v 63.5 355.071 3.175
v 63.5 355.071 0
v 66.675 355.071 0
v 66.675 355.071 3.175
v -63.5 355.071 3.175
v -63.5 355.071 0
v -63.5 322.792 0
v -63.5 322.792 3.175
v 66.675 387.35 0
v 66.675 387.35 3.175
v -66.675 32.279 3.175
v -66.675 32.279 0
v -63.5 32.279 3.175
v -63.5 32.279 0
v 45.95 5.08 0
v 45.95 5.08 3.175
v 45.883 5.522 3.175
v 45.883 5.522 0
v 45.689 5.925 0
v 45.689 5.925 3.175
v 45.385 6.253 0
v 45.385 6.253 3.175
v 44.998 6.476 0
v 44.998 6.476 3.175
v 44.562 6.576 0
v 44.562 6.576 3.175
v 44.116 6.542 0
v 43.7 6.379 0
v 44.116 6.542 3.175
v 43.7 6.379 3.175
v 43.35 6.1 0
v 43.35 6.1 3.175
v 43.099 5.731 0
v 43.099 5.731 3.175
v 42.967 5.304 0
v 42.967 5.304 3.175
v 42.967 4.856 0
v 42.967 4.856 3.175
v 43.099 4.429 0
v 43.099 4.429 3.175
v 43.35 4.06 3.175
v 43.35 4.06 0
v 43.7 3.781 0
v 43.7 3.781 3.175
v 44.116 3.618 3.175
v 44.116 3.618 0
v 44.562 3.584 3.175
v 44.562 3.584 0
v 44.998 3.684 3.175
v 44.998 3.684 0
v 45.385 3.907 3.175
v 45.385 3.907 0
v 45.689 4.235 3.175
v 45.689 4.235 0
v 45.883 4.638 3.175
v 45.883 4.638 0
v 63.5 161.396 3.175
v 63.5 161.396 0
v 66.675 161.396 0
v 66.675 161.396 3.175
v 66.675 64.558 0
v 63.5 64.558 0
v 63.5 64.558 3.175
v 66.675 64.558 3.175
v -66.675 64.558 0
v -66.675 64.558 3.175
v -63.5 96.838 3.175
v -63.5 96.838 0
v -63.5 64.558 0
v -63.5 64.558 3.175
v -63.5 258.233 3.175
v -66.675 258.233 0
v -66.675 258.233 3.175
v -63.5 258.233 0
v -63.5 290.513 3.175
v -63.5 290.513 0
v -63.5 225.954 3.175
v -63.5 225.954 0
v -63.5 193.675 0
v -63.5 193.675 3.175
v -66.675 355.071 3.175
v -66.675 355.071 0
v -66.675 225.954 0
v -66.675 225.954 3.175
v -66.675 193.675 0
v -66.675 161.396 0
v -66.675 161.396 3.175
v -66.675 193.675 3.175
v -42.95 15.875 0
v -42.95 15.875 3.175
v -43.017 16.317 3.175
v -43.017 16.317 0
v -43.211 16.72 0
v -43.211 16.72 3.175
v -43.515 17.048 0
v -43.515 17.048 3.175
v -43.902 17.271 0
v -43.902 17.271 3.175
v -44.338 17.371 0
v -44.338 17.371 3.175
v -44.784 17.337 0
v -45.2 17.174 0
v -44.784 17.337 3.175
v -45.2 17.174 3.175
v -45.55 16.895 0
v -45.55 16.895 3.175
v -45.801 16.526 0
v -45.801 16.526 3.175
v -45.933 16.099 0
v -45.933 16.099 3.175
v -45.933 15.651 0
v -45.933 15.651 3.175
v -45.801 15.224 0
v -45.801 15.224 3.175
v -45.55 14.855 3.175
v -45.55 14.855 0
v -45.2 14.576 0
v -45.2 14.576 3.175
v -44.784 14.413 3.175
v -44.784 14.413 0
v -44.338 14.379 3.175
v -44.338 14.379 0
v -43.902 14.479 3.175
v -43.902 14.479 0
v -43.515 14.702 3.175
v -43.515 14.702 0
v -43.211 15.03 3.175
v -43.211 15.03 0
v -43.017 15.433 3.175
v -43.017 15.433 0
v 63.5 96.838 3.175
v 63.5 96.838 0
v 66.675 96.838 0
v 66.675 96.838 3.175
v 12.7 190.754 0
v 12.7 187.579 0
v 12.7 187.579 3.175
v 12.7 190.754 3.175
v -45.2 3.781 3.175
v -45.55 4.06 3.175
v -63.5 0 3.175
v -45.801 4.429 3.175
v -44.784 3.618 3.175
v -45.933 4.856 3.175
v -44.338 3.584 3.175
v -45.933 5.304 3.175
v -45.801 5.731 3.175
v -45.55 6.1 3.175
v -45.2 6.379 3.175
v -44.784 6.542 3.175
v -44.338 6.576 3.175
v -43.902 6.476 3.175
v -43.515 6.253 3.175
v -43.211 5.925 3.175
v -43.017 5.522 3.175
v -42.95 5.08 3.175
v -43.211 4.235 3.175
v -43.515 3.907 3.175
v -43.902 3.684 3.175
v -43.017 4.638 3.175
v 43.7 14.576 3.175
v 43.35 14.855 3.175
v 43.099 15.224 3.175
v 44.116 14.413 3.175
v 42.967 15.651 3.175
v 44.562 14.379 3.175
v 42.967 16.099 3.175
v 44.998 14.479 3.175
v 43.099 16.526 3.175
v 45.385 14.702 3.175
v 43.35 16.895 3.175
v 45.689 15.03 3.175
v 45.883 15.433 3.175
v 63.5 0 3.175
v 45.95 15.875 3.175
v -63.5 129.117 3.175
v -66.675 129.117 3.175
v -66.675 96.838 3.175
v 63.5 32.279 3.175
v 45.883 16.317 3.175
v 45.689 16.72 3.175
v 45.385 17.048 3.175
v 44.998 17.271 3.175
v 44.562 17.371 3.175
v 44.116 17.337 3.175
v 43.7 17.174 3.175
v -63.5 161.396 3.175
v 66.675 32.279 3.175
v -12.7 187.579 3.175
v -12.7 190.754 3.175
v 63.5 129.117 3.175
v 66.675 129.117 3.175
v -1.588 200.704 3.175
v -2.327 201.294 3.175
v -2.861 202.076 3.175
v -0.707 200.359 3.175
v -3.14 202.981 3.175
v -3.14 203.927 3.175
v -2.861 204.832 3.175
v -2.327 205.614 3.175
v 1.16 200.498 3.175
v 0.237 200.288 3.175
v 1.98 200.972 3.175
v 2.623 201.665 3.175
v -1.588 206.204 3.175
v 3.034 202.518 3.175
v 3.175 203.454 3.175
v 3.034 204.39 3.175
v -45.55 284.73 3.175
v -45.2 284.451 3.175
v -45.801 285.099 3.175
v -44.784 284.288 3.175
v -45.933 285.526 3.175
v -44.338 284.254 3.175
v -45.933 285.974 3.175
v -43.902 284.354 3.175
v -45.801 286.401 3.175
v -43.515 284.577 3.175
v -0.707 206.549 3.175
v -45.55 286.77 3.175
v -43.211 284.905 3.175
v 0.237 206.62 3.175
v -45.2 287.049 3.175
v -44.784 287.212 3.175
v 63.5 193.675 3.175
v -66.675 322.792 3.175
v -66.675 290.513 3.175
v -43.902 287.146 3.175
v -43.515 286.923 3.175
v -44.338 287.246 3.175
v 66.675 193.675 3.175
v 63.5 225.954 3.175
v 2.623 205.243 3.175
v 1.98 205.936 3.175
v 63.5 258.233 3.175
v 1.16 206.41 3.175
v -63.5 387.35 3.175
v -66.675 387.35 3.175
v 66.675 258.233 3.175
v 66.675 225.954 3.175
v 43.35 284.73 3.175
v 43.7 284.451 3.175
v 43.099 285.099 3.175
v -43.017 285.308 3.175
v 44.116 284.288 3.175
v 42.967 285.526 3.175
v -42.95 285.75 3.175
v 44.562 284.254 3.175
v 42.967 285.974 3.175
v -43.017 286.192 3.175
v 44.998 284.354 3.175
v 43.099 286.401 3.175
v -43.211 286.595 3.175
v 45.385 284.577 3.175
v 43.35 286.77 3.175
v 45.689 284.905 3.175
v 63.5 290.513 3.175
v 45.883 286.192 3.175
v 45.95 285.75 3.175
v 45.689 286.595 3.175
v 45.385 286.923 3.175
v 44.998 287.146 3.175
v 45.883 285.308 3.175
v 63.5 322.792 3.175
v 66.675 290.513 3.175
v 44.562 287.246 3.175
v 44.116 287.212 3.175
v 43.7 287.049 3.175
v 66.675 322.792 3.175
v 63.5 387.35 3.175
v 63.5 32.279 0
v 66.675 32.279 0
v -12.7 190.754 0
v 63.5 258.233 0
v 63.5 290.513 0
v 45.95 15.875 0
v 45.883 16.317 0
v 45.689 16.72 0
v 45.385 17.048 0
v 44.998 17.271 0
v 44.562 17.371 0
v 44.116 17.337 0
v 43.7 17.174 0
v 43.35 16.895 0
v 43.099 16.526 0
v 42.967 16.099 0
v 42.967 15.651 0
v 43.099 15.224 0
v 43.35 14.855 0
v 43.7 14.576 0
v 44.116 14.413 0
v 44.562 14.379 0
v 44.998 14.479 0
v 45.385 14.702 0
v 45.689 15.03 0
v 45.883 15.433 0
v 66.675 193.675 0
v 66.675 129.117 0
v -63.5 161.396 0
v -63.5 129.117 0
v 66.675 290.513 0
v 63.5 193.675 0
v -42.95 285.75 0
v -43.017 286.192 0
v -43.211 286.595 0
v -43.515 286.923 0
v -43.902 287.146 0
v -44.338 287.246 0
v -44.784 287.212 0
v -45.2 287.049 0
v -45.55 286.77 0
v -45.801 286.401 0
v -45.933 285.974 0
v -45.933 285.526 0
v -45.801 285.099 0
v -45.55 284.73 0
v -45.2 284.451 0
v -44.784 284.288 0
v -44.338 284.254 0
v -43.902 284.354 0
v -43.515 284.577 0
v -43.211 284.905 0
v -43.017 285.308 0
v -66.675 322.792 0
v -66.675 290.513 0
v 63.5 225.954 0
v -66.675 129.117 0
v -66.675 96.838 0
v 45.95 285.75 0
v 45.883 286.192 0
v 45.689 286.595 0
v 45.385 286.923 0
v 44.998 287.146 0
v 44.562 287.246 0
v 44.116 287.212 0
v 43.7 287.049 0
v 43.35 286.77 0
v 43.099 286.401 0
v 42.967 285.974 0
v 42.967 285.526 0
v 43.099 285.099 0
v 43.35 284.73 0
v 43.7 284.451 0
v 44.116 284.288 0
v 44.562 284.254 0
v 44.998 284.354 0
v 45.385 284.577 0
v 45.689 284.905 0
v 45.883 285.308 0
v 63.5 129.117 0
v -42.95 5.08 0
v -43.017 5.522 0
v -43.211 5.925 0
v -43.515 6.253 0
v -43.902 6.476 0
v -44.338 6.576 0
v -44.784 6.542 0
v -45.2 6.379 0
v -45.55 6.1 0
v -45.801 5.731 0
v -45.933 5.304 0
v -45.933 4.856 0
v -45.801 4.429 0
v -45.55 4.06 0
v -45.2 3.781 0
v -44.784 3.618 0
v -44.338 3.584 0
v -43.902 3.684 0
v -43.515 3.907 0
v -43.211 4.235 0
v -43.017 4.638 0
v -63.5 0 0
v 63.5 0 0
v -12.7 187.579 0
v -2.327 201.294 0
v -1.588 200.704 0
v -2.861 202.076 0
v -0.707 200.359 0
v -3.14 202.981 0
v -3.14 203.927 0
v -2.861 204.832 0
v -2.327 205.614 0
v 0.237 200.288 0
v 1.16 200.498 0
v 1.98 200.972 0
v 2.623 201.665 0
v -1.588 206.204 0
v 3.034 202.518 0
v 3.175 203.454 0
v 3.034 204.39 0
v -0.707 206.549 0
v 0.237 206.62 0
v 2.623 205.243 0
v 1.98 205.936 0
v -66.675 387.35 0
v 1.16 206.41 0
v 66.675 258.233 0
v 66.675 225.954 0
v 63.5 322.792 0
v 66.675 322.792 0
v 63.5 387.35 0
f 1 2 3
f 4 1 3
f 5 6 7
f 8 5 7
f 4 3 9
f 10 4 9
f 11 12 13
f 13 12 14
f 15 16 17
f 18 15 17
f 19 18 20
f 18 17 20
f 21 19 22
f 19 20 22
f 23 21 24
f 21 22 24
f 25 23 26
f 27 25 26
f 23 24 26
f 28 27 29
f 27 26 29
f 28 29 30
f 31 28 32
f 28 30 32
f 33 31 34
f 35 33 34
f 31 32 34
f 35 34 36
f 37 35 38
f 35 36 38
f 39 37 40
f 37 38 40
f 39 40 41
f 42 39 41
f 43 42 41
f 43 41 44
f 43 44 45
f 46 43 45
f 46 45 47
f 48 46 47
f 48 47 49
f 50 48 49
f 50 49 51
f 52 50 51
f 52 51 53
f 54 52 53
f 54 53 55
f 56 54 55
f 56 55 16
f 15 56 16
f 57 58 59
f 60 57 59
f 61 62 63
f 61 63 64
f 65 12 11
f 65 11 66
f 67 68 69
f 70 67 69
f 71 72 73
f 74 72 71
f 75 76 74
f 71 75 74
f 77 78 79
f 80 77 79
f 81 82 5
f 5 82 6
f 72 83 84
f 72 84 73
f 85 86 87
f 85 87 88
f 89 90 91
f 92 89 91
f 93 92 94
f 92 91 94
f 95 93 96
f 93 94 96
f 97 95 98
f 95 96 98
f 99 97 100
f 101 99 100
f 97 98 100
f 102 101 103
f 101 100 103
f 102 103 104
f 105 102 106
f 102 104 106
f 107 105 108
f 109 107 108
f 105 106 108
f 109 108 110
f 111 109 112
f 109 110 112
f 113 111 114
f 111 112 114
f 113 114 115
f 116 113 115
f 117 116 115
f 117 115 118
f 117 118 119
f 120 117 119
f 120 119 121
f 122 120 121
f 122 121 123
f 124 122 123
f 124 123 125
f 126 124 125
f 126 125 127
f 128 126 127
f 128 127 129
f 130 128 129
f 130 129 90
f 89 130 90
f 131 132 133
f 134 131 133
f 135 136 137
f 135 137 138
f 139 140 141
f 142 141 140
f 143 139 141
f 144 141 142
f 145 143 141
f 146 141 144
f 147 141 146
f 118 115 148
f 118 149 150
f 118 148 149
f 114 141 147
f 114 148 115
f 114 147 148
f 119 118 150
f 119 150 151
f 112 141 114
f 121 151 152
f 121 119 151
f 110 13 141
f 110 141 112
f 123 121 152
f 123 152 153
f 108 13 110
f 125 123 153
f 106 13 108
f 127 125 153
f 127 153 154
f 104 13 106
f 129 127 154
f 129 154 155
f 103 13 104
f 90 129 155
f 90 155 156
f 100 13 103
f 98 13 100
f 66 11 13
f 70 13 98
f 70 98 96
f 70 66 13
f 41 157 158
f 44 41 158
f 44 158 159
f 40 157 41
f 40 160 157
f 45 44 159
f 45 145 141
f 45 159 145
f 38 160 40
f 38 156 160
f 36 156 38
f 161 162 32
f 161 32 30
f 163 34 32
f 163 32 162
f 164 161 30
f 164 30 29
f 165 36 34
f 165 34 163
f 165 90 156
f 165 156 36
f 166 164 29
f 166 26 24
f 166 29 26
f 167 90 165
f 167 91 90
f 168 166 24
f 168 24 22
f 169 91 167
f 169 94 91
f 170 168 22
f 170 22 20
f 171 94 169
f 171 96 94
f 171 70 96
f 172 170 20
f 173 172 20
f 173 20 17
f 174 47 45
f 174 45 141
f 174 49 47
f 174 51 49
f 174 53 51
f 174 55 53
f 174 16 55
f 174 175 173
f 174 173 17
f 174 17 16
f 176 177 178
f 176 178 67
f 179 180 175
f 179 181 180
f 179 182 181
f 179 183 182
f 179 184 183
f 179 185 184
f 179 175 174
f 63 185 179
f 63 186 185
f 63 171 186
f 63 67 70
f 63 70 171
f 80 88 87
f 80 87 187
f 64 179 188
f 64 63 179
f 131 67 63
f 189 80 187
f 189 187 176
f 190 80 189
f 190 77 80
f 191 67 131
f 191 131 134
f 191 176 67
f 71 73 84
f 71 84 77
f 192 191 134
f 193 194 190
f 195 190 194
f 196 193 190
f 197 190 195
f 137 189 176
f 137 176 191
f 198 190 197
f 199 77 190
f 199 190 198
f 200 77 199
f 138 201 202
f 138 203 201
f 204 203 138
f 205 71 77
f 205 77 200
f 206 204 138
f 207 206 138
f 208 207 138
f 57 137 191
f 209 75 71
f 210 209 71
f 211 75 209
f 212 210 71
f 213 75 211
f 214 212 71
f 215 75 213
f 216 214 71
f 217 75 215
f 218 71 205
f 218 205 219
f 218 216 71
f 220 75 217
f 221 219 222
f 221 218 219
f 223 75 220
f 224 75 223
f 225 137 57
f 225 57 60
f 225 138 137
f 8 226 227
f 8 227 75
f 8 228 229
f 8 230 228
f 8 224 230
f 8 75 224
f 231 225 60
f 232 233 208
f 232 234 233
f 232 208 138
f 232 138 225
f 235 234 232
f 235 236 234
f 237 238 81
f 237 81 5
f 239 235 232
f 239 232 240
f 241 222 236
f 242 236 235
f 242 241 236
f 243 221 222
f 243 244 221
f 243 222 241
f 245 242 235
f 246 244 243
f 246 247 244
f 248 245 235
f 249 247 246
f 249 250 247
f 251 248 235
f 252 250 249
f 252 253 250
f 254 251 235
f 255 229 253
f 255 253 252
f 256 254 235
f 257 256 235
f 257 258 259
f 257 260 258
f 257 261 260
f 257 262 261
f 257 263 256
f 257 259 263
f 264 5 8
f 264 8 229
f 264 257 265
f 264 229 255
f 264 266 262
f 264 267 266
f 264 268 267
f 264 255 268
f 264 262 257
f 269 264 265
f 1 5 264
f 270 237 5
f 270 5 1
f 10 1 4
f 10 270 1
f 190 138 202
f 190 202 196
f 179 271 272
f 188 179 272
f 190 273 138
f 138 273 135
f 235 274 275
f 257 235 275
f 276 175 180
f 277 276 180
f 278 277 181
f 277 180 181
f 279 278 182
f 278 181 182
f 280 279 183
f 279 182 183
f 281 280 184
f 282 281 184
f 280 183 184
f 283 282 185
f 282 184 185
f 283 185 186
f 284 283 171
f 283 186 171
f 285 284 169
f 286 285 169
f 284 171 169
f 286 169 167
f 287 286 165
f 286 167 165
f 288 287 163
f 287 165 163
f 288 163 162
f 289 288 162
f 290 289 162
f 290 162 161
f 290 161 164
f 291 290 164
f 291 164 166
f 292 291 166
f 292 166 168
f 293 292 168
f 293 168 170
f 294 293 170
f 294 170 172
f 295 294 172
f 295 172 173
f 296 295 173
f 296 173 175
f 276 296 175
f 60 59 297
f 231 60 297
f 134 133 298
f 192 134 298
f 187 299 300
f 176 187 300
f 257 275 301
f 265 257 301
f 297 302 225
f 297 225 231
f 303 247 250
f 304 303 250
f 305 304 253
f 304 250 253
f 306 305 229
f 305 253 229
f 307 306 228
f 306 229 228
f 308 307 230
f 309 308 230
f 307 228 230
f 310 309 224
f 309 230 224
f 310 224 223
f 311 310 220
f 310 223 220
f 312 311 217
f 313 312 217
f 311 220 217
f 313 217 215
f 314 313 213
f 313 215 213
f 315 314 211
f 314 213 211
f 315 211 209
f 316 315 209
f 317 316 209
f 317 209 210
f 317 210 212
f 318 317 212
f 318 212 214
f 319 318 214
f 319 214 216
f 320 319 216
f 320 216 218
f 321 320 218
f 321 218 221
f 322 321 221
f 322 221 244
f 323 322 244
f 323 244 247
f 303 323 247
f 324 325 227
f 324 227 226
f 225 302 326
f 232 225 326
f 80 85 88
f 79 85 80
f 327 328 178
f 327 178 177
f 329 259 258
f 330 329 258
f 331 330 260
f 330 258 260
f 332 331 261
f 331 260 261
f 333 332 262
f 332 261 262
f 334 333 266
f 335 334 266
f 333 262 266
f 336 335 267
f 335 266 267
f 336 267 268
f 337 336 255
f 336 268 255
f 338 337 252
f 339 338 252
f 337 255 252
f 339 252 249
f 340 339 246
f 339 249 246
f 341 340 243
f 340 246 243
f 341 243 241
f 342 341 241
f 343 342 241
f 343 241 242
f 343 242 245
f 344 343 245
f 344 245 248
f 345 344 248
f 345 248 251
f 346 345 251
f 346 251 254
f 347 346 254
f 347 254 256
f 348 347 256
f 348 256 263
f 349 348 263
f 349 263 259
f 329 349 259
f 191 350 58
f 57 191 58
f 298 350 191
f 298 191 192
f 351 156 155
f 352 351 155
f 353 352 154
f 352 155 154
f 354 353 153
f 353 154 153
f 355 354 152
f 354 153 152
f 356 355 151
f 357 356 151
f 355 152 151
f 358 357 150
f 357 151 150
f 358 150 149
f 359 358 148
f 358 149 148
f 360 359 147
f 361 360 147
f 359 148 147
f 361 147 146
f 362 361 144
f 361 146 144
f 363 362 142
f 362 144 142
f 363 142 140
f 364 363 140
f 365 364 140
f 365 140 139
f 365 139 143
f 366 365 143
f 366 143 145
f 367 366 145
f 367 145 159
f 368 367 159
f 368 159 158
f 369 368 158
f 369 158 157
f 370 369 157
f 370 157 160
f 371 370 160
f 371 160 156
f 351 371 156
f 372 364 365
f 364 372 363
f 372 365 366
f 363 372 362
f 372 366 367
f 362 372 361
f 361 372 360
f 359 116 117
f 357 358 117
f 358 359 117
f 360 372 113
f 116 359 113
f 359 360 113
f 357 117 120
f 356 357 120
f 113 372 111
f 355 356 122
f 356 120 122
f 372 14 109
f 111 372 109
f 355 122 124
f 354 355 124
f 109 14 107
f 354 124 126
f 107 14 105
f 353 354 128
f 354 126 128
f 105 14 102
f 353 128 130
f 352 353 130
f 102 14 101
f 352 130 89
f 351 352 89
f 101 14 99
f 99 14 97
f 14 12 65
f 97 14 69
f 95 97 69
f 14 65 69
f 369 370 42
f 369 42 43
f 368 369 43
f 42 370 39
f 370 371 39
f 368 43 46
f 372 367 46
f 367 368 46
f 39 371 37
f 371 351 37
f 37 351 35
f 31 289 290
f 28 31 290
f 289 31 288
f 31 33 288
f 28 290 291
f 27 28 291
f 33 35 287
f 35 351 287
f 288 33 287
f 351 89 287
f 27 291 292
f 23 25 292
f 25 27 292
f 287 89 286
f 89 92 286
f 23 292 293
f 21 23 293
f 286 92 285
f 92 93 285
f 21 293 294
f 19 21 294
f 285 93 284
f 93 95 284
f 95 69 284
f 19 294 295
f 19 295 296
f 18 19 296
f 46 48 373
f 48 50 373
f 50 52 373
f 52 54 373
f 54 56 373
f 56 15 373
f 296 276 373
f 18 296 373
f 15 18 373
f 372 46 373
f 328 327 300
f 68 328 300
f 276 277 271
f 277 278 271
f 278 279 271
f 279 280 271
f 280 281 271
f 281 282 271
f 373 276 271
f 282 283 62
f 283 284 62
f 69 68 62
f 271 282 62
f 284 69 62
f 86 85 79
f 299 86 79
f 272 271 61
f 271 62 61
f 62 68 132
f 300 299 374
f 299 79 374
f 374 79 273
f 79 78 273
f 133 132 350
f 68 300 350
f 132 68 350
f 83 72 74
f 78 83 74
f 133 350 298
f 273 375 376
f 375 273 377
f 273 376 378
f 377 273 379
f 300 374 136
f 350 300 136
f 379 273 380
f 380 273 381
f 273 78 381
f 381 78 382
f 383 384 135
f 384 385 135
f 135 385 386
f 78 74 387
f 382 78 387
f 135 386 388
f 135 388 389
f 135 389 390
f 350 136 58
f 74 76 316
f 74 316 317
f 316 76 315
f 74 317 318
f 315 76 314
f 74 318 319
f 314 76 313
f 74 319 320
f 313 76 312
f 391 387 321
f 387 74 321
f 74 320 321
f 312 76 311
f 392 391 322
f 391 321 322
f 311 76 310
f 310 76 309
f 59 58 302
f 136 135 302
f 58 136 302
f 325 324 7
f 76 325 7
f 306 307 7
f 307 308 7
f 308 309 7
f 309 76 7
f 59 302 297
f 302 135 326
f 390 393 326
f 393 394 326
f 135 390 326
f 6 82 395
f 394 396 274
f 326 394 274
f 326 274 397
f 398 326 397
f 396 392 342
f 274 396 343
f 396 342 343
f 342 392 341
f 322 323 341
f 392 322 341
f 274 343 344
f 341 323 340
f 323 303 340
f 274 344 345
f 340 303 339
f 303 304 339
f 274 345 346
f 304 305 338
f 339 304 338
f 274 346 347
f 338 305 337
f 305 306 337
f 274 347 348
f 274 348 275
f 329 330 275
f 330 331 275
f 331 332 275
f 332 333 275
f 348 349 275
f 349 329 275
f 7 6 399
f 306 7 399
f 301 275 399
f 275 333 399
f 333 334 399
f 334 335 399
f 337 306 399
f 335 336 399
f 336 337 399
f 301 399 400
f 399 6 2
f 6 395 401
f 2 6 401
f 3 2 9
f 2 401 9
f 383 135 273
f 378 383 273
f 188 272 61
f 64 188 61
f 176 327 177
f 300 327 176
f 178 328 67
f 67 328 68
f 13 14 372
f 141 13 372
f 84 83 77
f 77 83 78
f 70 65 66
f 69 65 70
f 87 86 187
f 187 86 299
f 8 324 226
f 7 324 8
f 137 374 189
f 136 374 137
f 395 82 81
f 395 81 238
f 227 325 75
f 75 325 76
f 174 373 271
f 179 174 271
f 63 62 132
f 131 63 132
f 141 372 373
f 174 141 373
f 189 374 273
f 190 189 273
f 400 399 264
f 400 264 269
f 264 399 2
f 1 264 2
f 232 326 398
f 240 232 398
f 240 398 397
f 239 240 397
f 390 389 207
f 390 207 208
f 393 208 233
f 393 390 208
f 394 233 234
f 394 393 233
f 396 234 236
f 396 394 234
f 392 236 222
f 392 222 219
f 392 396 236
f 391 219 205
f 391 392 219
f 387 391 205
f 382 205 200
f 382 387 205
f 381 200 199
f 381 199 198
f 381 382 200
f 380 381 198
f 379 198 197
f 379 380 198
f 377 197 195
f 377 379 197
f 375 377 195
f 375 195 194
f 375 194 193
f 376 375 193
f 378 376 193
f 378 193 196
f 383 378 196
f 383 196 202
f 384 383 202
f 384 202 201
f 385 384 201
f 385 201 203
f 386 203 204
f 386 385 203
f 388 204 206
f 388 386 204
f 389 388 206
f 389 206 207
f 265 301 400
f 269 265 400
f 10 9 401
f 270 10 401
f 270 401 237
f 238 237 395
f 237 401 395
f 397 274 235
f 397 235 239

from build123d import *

# Parameters (mm, degrees)
SKETCH1_W           = 25.4
SKETCH1_H           = 3.175
SKETCH1_R           = 3.175
SKETCH1_W_2         = 3.175
SKETCH1_H_2         = 32.279166667
SKETCH1_H_3         = 32.279166666
BOSS_EXTRUDE1_DEPTH = 3.175
SKETCH2_R           = 1.5
CUT_EXTRUDE1_DEPTH  = 394.059357795


with BuildPart() as part:
    # Sketch1 → Boss-Extrude1 (new body)
    # profile 1 of 13: a face of its own
    with BuildSketch(Plane.XY):
        Polygon((63.5, 387.35), (-63.5, 387.35), (-63.5, 355.070833333), (-63.5, 322.791666667), (-63.5, 290.5125), (-63.5, 258.233333333), (-63.5, 225.954166667), (-63.5, 193.675), (-63.5, 161.395833333), (-63.5, 129.116666667), (-63.5, 96.8375), (-63.5, 64.558333333), (-63.5, 32.279166667), (-63.5, 0), (63.5, 0), (63.5, 32.279166667), (63.5, 64.558333333), (63.5, 96.8375), (63.5, 129.116666667), (63.5, 161.395833333), (63.5, 193.675), (63.5, 225.954166667), (63.5, 258.233333333), (63.5, 290.5125), (63.5, 322.791666667), (63.5, 355.070833333), align=None)
        with Locations((0, 189.1665)):
            Rectangle(SKETCH1_W, SKETCH1_H, mode=Mode.SUBTRACT)
        with Locations((0, 203.454)):
            Circle(SKETCH1_R, mode=Mode.SUBTRACT)
    # profile 2 of 13: a face of its own
    with BuildSketch(Plane.XY):
        with Locations((-65.0875, 371.210416667)):
            Rectangle(SKETCH1_W_2, SKETCH1_H_2)
    # profile 3 of 13: a face of its own
    with BuildSketch(Plane.XY):
        with Locations((-65.0875, 306.652083334)):
            Rectangle(SKETCH1_W_2, SKETCH1_H_2)
    # profile 4 of 13: a face of its own
    with BuildSketch(Plane.XY):
        with Locations((-65.0875, 242.09375)):
            Rectangle(SKETCH1_W_2, SKETCH1_H_3)
    # profile 5 of 13: a face of its own
    with BuildSketch(Plane.XY):
        with Locations((-65.0875, 177.535416666)):
            Rectangle(SKETCH1_W_2, SKETCH1_H_2)
    # profile 6 of 13: a face of its own
    with BuildSketch(Plane.XY):
        with Locations((65.0875, 371.210416667)):
            Rectangle(SKETCH1_W_2, SKETCH1_H_2)
    # profile 7 of 13: a face of its own
    with BuildSketch(Plane.XY):
        with Locations((65.0875, 306.652083334)):
            Rectangle(SKETCH1_W_2, SKETCH1_H_2)
    # profile 8 of 13: a face of its own
    with BuildSketch(Plane.XY):
        with Locations((65.0875, 242.09375)):
            Rectangle(SKETCH1_W_2, SKETCH1_H_3)
    # profile 9 of 13: a face of its own
    with BuildSketch(Plane.XY):
        with Locations((65.0875, 177.535416666)):
            Rectangle(SKETCH1_W_2, SKETCH1_H_2)
    # profile 10 of 13: a face of its own
    with BuildSketch(Plane.XY):
        with Locations((65.0875, 112.977083334)):
            Rectangle(SKETCH1_W_2, SKETCH1_H_2)
    # profile 11 of 13: a face of its own
    with BuildSketch(Plane.XY):
        with Locations((-65.0875, 112.977083334)):
            Rectangle(SKETCH1_W_2, SKETCH1_H_2)
    # profile 12 of 13: a face of its own
    with BuildSketch(Plane.XY):
        with Locations((-65.0875, 48.41875)):
            Rectangle(SKETCH1_W_2, SKETCH1_H_3)
    # profile 13 of 13: a face of its own
    with BuildSketch(Plane.XY):
        with Locations((65.0875, 48.41875)):
            Rectangle(SKETCH1_W_2, SKETCH1_H_3)
    extrude(amount=BOSS_EXTRUDE1_DEPTH)

    # Sketch2 → Cut-Extrude1 (cut, through all)
    with BuildSketch(Plane.XY.offset(3.175)):
        with Locations((-44.45, 285.75)):
            Circle(SKETCH2_R)
        with Locations((44.45, 285.75)):
            Circle(SKETCH2_R)
        with Locations((-44.45, 15.875)):
            Circle(SKETCH2_R)
        with Locations((44.45, 15.875)):
            Circle(SKETCH2_R)
        with Locations((-44.45, 5.08)):
            Circle(SKETCH2_R)
        with Locations((44.45, 5.08)):
            Circle(SKETCH2_R)
    extrude(amount=-CUT_EXTRUDE1_DEPTH, mode=Mode.SUBTRACT)


solid = part.part
